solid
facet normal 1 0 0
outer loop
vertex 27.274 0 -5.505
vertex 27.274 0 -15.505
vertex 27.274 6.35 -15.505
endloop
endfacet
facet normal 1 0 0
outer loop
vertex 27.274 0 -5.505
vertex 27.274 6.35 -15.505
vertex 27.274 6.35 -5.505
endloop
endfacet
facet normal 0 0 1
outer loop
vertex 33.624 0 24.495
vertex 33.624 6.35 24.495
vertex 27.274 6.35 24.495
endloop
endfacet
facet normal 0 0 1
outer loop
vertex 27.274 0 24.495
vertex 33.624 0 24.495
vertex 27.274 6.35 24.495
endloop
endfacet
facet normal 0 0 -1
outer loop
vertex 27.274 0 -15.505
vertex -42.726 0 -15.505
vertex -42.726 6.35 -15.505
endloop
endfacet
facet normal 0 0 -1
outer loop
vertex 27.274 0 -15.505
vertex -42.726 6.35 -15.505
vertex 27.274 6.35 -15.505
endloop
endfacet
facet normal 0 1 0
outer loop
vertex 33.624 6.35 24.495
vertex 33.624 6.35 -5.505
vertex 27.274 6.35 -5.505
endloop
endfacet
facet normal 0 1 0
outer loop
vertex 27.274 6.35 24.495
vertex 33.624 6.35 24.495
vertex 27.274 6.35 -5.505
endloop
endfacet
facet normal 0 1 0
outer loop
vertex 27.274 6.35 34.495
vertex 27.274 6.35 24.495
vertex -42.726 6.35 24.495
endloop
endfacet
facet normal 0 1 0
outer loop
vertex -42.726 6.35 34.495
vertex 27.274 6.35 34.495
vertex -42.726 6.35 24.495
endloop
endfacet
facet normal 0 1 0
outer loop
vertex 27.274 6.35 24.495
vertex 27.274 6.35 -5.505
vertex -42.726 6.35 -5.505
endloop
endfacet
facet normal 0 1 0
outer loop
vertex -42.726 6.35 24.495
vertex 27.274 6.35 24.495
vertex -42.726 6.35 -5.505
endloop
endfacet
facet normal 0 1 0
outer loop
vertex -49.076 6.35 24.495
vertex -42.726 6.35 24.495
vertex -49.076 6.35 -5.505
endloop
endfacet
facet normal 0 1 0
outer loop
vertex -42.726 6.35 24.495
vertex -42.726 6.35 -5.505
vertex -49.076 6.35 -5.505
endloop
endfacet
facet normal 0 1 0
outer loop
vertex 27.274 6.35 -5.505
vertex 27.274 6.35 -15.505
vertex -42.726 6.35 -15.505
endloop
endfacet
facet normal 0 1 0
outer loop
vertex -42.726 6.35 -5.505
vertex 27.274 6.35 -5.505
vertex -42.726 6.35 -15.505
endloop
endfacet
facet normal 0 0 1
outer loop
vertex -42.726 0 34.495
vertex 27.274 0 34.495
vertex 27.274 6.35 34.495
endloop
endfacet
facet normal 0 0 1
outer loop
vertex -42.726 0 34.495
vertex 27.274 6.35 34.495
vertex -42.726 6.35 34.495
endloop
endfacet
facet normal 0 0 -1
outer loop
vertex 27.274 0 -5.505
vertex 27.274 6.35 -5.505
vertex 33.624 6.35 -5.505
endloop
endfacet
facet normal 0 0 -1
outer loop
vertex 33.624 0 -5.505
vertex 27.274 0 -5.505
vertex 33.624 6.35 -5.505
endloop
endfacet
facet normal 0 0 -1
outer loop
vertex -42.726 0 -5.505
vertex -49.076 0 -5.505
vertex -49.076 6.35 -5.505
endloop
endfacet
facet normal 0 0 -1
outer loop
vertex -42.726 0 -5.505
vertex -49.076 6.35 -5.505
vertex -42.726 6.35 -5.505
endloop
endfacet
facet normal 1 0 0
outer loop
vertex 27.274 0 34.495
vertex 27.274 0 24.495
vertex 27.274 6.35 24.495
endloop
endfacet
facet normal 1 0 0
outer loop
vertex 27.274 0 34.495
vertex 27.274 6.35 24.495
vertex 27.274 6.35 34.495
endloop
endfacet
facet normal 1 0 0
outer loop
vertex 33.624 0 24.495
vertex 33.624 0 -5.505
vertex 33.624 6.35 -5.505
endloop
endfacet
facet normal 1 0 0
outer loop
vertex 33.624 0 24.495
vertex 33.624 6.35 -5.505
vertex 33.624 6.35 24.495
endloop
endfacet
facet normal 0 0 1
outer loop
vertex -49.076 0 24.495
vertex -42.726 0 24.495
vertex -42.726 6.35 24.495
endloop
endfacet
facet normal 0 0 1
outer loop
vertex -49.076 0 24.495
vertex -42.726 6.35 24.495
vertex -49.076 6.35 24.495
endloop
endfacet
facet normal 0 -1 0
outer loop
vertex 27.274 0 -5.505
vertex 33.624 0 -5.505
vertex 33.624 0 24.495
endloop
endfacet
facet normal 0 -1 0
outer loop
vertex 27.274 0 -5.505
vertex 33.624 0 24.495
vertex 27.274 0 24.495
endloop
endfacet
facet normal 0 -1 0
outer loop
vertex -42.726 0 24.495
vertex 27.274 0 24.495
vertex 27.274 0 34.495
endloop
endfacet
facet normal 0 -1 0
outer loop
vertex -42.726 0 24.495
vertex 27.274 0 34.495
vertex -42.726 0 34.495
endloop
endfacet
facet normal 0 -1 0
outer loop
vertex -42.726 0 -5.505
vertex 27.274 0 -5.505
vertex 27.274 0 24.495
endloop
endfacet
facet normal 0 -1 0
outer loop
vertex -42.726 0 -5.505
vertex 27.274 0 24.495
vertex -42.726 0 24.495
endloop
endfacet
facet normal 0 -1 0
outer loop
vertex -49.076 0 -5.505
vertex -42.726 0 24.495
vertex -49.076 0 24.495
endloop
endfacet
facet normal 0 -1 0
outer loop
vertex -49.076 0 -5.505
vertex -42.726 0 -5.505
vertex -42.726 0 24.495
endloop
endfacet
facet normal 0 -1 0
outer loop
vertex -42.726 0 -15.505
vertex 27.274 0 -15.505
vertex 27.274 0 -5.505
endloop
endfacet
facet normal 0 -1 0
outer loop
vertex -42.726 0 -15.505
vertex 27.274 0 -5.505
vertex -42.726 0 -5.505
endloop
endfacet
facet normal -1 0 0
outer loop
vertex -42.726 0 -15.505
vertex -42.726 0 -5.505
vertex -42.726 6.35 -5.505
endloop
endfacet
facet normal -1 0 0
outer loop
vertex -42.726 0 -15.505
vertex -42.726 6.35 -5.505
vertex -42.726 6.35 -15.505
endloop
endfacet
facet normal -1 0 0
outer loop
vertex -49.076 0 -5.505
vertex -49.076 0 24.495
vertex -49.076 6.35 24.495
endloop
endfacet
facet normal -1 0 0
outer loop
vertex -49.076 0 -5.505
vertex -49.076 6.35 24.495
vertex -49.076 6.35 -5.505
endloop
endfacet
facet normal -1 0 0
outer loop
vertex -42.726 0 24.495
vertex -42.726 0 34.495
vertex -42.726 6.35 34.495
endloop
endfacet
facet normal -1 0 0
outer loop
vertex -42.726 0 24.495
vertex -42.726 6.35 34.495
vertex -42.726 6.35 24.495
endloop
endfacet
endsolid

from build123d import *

# Parameters (mm, degrees)
BODY_DEPTH = 6.35


with BuildPart() as part:
    # Sketch1 → Body (new body)
    with BuildSketch(Plane(origin=(0, 0, 0), x_dir=(1, 0, 0), z_dir=(0, 1, 0))):
        Polygon((-49.076012748, 5.505075896), (-42.726012748, 5.505075896), (-42.726012748, 15.505075896), (27.273987252, 15.505075896), (27.273987252, 5.505075896), (33.623987252, 5.505075896), (33.623987252, -24.494924104), (27.273987252, -24.494924104), (27.273987252, -34.494924104), (-42.726012748, -34.494924104), (-42.726012748, -24.494924104), (-49.076012748, -24.494924104), align=None)
    extrude(amount=BODY_DEPTH)


solid = part.part
